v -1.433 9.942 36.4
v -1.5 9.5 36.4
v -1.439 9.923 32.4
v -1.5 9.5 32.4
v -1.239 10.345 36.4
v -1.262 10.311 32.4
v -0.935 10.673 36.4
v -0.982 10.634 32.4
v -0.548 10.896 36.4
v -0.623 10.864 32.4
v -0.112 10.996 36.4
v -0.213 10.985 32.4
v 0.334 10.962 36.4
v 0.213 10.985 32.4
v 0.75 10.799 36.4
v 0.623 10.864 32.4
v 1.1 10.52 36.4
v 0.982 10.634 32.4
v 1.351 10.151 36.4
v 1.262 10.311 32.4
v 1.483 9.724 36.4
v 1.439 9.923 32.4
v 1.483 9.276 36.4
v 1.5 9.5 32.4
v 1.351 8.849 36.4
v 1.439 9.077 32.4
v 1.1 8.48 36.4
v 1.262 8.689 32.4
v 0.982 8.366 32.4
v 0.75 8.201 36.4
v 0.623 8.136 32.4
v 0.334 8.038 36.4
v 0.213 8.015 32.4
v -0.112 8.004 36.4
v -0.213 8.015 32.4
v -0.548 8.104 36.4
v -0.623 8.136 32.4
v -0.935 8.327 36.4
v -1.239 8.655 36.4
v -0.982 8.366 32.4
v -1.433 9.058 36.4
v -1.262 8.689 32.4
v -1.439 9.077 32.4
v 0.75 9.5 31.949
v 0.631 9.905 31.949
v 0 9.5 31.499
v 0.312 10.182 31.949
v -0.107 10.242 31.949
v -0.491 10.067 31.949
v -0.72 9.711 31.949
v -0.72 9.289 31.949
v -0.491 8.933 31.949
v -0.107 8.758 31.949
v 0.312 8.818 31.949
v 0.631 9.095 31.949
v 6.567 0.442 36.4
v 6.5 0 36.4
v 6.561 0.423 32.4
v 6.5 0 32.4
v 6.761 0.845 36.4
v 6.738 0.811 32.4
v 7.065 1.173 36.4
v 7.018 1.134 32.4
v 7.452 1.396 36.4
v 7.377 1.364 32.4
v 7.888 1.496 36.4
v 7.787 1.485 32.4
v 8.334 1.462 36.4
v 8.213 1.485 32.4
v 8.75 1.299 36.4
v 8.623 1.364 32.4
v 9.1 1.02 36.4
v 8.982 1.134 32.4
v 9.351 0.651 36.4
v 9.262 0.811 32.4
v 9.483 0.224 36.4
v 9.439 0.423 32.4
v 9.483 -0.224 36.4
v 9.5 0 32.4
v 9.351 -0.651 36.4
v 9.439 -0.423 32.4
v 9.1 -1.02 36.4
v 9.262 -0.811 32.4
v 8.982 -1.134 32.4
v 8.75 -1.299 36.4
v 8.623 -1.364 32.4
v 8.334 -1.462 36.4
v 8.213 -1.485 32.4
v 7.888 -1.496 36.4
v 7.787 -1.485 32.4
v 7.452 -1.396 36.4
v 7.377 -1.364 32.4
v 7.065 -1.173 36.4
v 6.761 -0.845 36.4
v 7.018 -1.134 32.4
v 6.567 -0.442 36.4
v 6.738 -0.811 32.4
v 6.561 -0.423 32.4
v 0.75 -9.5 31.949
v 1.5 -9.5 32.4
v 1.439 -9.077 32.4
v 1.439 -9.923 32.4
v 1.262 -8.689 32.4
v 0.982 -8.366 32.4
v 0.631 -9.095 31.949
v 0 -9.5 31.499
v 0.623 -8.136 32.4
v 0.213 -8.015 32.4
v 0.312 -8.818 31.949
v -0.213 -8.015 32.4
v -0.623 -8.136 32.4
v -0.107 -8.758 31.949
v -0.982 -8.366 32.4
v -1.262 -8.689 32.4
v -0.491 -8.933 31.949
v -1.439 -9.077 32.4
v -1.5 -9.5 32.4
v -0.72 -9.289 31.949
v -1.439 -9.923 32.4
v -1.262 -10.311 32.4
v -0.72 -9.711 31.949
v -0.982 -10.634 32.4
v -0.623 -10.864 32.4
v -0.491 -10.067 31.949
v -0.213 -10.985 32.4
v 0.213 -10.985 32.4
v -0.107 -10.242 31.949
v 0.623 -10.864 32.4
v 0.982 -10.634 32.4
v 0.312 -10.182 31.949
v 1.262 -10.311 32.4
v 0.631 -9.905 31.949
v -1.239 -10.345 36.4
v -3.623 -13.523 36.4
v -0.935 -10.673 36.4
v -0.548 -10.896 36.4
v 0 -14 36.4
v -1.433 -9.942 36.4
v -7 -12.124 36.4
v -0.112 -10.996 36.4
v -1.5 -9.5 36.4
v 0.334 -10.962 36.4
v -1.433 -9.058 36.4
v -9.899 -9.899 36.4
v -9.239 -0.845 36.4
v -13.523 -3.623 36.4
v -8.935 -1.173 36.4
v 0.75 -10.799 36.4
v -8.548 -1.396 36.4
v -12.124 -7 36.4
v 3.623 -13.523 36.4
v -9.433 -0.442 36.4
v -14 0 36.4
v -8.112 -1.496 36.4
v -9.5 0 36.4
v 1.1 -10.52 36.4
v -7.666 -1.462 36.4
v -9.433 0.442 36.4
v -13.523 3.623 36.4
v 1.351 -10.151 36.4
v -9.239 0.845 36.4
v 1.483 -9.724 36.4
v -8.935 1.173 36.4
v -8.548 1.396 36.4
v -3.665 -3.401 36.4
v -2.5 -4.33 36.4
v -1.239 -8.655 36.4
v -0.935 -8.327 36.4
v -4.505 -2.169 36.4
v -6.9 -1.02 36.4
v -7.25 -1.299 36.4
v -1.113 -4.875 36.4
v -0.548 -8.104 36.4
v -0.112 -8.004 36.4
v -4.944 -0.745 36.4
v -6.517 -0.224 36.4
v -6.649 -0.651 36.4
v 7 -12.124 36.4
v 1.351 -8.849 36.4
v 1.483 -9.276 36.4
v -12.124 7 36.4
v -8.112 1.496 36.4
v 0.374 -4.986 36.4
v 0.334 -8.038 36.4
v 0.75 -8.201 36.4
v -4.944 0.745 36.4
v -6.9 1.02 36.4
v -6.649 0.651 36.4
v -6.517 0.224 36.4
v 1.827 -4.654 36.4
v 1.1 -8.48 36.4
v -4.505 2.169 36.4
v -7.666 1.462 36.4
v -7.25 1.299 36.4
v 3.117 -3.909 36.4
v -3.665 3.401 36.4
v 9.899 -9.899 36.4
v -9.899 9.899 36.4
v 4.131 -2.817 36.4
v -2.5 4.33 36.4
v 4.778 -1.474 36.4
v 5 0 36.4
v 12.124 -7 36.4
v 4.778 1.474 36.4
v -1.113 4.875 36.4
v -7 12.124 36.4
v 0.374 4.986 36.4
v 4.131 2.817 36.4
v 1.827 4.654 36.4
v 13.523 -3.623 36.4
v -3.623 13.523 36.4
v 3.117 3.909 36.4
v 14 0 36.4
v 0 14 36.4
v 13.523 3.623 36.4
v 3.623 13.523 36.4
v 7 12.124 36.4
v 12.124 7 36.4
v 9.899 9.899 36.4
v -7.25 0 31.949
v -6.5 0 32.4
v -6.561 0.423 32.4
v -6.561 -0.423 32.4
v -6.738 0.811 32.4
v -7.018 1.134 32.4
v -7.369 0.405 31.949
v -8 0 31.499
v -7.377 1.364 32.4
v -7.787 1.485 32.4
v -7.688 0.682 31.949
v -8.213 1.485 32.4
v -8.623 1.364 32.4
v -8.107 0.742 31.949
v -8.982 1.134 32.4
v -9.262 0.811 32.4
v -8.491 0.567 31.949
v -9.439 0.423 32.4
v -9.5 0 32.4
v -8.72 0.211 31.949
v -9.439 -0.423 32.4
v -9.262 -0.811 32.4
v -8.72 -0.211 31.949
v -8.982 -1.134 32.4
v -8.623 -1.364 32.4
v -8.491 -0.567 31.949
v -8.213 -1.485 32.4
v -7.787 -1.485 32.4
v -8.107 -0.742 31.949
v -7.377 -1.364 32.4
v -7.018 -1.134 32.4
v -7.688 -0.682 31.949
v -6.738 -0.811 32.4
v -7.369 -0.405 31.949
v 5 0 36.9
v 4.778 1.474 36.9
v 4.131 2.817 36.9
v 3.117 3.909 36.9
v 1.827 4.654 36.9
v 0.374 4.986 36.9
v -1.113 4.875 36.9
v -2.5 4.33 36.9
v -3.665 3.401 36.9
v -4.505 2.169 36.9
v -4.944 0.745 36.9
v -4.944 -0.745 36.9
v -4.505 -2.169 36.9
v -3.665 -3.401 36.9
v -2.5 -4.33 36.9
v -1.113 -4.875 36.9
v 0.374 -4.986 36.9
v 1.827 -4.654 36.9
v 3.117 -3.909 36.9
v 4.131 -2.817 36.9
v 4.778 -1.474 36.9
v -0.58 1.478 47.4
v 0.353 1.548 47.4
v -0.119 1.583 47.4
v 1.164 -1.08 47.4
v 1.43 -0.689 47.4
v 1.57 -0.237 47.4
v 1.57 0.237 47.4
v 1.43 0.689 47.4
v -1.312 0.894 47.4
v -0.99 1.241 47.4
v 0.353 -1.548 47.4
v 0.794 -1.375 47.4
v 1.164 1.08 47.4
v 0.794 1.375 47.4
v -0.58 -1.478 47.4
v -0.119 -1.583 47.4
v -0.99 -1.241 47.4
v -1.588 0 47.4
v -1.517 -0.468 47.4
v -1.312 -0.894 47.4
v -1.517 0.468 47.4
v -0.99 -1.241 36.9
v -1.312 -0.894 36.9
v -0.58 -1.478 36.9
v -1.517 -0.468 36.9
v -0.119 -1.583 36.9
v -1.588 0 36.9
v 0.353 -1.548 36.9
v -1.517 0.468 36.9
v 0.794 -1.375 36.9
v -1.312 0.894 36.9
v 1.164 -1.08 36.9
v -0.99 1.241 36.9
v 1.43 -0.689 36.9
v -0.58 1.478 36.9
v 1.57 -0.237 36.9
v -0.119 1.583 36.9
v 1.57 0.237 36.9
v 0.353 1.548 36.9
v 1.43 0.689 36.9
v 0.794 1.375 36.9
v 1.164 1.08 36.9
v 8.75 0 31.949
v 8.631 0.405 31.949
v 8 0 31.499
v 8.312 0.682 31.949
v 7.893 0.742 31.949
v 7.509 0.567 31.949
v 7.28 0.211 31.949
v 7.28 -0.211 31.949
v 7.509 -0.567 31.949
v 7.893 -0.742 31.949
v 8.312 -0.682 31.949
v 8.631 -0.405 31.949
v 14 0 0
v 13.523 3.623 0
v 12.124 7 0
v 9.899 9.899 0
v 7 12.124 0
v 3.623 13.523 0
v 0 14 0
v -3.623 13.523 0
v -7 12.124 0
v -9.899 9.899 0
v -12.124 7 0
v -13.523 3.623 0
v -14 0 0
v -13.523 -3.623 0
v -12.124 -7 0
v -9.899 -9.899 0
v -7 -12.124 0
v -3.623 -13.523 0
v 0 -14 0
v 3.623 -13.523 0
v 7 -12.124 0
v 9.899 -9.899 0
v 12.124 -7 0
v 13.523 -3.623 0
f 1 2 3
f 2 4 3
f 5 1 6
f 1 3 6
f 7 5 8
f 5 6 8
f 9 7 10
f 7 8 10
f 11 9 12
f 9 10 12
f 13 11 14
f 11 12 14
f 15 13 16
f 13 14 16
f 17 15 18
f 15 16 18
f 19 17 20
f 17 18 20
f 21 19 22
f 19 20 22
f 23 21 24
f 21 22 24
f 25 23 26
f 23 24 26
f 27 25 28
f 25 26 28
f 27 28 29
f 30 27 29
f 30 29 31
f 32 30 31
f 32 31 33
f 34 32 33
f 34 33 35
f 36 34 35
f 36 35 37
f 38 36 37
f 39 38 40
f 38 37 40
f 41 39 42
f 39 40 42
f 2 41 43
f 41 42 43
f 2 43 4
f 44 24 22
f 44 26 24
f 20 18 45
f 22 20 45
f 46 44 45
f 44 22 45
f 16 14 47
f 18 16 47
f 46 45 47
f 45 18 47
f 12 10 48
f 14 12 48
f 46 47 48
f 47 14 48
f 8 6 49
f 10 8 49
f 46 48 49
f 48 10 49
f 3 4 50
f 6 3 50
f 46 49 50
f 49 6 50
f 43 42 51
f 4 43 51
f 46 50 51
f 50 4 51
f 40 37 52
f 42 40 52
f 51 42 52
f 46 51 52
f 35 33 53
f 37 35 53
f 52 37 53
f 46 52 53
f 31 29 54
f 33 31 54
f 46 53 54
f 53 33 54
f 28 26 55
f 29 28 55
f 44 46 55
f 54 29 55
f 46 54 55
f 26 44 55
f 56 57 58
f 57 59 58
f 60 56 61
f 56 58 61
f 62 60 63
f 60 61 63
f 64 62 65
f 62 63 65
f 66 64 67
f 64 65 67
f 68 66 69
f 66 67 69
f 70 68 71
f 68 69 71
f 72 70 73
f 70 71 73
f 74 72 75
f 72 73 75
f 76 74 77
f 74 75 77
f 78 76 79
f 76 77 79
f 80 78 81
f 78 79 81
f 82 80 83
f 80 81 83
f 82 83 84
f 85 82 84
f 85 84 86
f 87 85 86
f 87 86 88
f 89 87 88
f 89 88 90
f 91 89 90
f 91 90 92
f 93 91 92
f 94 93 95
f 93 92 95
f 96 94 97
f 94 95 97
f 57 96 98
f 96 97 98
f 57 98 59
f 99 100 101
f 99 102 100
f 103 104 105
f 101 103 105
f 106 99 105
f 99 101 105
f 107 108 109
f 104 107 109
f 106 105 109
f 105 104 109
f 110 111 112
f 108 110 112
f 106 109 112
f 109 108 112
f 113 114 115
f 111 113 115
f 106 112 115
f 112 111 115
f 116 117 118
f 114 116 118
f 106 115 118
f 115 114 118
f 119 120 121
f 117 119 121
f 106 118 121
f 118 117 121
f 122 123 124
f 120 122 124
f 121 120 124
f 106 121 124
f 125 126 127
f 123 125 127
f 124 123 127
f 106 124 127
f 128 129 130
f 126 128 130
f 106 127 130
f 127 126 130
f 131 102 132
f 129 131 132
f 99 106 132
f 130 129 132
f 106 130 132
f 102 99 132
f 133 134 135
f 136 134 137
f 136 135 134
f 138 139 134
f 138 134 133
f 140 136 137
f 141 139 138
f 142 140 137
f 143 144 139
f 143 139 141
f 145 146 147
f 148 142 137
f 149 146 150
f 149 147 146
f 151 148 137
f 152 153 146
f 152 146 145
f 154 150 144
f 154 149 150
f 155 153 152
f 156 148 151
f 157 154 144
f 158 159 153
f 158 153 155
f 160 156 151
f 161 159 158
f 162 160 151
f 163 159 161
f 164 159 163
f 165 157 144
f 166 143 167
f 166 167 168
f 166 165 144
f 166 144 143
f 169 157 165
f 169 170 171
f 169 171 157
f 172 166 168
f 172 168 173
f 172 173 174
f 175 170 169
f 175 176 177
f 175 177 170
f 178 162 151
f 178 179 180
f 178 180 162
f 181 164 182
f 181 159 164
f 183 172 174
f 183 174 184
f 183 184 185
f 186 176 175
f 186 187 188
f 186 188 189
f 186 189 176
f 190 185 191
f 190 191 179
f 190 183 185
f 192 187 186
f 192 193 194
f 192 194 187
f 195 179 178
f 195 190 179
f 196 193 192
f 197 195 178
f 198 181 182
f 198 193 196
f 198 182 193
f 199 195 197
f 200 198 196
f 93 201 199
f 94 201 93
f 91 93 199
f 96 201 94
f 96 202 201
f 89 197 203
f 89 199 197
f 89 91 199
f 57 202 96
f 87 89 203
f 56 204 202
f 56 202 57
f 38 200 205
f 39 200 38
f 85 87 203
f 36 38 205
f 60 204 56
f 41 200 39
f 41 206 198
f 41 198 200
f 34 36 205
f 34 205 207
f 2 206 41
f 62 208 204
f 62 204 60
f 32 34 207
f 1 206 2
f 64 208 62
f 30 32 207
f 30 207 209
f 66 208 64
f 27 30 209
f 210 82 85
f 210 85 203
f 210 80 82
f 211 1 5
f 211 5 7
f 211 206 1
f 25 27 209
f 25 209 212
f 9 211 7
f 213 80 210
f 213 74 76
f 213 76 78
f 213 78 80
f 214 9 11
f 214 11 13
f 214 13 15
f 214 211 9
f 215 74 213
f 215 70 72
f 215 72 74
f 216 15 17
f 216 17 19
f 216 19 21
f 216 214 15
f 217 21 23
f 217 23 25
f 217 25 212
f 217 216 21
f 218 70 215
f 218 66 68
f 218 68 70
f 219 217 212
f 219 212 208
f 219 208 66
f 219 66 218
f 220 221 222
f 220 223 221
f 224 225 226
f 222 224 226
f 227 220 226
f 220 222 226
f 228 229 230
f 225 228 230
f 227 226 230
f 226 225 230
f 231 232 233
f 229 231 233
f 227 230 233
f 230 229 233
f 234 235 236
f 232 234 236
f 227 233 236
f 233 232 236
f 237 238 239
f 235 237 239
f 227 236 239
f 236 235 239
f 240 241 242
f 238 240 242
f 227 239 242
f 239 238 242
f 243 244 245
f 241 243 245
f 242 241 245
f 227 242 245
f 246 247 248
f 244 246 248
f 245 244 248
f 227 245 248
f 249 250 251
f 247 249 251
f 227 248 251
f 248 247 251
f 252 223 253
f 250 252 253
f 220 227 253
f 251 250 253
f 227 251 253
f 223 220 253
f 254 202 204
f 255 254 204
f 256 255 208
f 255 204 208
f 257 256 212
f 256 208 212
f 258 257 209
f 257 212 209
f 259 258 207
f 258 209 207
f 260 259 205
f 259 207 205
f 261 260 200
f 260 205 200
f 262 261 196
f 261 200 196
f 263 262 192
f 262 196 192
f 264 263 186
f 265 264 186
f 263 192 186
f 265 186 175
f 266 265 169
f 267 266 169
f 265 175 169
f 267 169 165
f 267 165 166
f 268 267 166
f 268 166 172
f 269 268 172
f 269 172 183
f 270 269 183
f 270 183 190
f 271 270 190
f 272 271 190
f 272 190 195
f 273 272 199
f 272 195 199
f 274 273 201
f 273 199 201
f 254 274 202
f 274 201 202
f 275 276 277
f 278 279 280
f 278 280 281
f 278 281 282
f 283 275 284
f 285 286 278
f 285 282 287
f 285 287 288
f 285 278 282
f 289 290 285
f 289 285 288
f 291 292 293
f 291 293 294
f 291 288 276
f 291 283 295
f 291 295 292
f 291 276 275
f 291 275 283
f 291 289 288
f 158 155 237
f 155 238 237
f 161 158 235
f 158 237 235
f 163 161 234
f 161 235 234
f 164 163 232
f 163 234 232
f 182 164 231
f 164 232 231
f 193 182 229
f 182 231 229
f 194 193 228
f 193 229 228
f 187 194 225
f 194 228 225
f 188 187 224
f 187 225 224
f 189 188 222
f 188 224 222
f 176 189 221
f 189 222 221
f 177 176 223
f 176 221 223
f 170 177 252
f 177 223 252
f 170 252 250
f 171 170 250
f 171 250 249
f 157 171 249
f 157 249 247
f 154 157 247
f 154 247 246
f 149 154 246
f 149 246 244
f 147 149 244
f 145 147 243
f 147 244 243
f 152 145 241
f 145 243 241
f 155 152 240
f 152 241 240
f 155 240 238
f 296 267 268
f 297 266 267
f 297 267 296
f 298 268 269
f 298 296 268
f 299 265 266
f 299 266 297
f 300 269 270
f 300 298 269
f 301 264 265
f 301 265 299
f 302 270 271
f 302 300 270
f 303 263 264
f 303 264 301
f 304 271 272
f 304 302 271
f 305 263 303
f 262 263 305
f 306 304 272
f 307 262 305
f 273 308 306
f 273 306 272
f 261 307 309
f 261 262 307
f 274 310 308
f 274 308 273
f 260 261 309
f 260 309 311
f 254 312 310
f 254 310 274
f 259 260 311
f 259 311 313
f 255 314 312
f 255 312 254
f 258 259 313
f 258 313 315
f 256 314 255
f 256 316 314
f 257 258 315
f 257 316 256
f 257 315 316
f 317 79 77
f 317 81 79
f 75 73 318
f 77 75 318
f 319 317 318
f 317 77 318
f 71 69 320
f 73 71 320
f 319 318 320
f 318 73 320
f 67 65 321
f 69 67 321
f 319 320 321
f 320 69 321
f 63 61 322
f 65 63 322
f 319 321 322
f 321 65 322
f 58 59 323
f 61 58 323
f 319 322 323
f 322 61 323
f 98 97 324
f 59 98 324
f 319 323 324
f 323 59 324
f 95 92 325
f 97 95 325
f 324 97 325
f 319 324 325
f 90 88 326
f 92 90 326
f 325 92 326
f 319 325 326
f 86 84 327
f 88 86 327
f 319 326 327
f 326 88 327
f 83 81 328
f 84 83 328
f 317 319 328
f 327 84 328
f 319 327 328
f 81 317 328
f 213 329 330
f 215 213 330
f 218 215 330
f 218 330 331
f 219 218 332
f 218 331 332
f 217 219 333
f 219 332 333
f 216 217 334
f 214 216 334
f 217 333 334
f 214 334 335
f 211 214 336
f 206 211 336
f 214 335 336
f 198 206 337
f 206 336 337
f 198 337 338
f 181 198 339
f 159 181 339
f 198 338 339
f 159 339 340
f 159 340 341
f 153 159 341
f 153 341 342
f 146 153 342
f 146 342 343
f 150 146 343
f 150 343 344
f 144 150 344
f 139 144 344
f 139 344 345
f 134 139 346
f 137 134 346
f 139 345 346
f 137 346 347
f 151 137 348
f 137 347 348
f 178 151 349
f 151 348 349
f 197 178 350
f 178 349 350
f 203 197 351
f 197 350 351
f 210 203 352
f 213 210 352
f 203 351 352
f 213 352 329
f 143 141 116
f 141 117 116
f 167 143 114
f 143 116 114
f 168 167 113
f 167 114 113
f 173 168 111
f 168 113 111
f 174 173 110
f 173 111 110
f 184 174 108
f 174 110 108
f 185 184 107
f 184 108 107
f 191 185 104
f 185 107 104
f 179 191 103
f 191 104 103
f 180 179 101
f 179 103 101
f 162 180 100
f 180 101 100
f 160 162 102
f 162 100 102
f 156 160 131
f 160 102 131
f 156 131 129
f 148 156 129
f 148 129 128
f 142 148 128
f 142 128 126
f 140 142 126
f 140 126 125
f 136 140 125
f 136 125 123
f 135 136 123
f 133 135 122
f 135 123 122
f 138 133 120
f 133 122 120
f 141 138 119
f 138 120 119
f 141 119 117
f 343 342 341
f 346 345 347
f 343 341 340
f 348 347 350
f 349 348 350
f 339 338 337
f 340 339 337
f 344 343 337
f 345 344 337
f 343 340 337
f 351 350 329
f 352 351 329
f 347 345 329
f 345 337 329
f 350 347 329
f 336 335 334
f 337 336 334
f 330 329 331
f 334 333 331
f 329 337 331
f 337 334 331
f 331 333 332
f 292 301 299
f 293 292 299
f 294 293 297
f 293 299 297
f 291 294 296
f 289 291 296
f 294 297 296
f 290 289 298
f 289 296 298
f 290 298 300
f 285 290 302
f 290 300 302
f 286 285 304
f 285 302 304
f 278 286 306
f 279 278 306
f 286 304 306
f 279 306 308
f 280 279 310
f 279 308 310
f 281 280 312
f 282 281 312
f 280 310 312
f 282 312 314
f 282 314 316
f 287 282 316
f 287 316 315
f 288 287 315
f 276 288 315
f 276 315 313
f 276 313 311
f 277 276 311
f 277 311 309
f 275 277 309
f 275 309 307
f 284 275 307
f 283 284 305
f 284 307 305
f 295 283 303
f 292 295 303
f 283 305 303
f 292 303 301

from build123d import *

# Parameters (mm, degrees)
SKETCH1_R                    = 14
BOSS_EXTRUDE1_DEPTH          = 36.4
SKETCH2_R                    = 5
BOSS_EXTRUDE2_DEPTH          = 0.5
SKETCH3_R                    = 1.5875
BOSS_EXTRUDE3_DEPTH          = 10.5
F_3_0_3_DIAMETER_HOLE1_D     = 3
F_3_0_3_DIAMETER_HOLE1_DEPTH = 4
F_3_0_3_DIAMETER_HOLE1_TIP   = 0.901290929


with BuildPart() as part:
    # Sketch1 → Boss-Extrude1 (new body)
    with BuildSketch(Plane.XY):
        Circle(SKETCH1_R)
    extrude(amount=BOSS_EXTRUDE1_DEPTH)

    # Sketch2 → Boss-Extrude2 (add)
    with BuildSketch(Plane.XY.offset(36.4)):
        Circle(SKETCH2_R)
    extrude(amount=BOSS_EXTRUDE2_DEPTH)

    # Sketch3 → Boss-Extrude3 (add)
    with BuildSketch(Plane.XY.offset(36.9)):
        with Locations(Location((0, 0, 0), (0, 0, 180))):
            Circle(SKETCH3_R)
    extrude(amount=BOSS_EXTRUDE3_DEPTH)

    # Ø3.0 (3) Diameter Hole1
    with Locations(Plane.XY.offset(36.4)):
        with Locations((0, 9.5), (0, -9.5), (8, 0), (-8, 0)):
            Hole(F_3_0_3_DIAMETER_HOLE1_D / 2, depth=F_3_0_3_DIAMETER_HOLE1_DEPTH)
            with Locations((0, 0, -(F_3_0_3_DIAMETER_HOLE1_DEPTH + F_3_0_3_DIAMETER_HOLE1_TIP / 2))):  # 118° drill point
                Cone(0, F_3_0_3_DIAMETER_HOLE1_D / 2, F_3_0_3_DIAMETER_HOLE1_TIP, mode=Mode.SUBTRACT)


solid = part.part
